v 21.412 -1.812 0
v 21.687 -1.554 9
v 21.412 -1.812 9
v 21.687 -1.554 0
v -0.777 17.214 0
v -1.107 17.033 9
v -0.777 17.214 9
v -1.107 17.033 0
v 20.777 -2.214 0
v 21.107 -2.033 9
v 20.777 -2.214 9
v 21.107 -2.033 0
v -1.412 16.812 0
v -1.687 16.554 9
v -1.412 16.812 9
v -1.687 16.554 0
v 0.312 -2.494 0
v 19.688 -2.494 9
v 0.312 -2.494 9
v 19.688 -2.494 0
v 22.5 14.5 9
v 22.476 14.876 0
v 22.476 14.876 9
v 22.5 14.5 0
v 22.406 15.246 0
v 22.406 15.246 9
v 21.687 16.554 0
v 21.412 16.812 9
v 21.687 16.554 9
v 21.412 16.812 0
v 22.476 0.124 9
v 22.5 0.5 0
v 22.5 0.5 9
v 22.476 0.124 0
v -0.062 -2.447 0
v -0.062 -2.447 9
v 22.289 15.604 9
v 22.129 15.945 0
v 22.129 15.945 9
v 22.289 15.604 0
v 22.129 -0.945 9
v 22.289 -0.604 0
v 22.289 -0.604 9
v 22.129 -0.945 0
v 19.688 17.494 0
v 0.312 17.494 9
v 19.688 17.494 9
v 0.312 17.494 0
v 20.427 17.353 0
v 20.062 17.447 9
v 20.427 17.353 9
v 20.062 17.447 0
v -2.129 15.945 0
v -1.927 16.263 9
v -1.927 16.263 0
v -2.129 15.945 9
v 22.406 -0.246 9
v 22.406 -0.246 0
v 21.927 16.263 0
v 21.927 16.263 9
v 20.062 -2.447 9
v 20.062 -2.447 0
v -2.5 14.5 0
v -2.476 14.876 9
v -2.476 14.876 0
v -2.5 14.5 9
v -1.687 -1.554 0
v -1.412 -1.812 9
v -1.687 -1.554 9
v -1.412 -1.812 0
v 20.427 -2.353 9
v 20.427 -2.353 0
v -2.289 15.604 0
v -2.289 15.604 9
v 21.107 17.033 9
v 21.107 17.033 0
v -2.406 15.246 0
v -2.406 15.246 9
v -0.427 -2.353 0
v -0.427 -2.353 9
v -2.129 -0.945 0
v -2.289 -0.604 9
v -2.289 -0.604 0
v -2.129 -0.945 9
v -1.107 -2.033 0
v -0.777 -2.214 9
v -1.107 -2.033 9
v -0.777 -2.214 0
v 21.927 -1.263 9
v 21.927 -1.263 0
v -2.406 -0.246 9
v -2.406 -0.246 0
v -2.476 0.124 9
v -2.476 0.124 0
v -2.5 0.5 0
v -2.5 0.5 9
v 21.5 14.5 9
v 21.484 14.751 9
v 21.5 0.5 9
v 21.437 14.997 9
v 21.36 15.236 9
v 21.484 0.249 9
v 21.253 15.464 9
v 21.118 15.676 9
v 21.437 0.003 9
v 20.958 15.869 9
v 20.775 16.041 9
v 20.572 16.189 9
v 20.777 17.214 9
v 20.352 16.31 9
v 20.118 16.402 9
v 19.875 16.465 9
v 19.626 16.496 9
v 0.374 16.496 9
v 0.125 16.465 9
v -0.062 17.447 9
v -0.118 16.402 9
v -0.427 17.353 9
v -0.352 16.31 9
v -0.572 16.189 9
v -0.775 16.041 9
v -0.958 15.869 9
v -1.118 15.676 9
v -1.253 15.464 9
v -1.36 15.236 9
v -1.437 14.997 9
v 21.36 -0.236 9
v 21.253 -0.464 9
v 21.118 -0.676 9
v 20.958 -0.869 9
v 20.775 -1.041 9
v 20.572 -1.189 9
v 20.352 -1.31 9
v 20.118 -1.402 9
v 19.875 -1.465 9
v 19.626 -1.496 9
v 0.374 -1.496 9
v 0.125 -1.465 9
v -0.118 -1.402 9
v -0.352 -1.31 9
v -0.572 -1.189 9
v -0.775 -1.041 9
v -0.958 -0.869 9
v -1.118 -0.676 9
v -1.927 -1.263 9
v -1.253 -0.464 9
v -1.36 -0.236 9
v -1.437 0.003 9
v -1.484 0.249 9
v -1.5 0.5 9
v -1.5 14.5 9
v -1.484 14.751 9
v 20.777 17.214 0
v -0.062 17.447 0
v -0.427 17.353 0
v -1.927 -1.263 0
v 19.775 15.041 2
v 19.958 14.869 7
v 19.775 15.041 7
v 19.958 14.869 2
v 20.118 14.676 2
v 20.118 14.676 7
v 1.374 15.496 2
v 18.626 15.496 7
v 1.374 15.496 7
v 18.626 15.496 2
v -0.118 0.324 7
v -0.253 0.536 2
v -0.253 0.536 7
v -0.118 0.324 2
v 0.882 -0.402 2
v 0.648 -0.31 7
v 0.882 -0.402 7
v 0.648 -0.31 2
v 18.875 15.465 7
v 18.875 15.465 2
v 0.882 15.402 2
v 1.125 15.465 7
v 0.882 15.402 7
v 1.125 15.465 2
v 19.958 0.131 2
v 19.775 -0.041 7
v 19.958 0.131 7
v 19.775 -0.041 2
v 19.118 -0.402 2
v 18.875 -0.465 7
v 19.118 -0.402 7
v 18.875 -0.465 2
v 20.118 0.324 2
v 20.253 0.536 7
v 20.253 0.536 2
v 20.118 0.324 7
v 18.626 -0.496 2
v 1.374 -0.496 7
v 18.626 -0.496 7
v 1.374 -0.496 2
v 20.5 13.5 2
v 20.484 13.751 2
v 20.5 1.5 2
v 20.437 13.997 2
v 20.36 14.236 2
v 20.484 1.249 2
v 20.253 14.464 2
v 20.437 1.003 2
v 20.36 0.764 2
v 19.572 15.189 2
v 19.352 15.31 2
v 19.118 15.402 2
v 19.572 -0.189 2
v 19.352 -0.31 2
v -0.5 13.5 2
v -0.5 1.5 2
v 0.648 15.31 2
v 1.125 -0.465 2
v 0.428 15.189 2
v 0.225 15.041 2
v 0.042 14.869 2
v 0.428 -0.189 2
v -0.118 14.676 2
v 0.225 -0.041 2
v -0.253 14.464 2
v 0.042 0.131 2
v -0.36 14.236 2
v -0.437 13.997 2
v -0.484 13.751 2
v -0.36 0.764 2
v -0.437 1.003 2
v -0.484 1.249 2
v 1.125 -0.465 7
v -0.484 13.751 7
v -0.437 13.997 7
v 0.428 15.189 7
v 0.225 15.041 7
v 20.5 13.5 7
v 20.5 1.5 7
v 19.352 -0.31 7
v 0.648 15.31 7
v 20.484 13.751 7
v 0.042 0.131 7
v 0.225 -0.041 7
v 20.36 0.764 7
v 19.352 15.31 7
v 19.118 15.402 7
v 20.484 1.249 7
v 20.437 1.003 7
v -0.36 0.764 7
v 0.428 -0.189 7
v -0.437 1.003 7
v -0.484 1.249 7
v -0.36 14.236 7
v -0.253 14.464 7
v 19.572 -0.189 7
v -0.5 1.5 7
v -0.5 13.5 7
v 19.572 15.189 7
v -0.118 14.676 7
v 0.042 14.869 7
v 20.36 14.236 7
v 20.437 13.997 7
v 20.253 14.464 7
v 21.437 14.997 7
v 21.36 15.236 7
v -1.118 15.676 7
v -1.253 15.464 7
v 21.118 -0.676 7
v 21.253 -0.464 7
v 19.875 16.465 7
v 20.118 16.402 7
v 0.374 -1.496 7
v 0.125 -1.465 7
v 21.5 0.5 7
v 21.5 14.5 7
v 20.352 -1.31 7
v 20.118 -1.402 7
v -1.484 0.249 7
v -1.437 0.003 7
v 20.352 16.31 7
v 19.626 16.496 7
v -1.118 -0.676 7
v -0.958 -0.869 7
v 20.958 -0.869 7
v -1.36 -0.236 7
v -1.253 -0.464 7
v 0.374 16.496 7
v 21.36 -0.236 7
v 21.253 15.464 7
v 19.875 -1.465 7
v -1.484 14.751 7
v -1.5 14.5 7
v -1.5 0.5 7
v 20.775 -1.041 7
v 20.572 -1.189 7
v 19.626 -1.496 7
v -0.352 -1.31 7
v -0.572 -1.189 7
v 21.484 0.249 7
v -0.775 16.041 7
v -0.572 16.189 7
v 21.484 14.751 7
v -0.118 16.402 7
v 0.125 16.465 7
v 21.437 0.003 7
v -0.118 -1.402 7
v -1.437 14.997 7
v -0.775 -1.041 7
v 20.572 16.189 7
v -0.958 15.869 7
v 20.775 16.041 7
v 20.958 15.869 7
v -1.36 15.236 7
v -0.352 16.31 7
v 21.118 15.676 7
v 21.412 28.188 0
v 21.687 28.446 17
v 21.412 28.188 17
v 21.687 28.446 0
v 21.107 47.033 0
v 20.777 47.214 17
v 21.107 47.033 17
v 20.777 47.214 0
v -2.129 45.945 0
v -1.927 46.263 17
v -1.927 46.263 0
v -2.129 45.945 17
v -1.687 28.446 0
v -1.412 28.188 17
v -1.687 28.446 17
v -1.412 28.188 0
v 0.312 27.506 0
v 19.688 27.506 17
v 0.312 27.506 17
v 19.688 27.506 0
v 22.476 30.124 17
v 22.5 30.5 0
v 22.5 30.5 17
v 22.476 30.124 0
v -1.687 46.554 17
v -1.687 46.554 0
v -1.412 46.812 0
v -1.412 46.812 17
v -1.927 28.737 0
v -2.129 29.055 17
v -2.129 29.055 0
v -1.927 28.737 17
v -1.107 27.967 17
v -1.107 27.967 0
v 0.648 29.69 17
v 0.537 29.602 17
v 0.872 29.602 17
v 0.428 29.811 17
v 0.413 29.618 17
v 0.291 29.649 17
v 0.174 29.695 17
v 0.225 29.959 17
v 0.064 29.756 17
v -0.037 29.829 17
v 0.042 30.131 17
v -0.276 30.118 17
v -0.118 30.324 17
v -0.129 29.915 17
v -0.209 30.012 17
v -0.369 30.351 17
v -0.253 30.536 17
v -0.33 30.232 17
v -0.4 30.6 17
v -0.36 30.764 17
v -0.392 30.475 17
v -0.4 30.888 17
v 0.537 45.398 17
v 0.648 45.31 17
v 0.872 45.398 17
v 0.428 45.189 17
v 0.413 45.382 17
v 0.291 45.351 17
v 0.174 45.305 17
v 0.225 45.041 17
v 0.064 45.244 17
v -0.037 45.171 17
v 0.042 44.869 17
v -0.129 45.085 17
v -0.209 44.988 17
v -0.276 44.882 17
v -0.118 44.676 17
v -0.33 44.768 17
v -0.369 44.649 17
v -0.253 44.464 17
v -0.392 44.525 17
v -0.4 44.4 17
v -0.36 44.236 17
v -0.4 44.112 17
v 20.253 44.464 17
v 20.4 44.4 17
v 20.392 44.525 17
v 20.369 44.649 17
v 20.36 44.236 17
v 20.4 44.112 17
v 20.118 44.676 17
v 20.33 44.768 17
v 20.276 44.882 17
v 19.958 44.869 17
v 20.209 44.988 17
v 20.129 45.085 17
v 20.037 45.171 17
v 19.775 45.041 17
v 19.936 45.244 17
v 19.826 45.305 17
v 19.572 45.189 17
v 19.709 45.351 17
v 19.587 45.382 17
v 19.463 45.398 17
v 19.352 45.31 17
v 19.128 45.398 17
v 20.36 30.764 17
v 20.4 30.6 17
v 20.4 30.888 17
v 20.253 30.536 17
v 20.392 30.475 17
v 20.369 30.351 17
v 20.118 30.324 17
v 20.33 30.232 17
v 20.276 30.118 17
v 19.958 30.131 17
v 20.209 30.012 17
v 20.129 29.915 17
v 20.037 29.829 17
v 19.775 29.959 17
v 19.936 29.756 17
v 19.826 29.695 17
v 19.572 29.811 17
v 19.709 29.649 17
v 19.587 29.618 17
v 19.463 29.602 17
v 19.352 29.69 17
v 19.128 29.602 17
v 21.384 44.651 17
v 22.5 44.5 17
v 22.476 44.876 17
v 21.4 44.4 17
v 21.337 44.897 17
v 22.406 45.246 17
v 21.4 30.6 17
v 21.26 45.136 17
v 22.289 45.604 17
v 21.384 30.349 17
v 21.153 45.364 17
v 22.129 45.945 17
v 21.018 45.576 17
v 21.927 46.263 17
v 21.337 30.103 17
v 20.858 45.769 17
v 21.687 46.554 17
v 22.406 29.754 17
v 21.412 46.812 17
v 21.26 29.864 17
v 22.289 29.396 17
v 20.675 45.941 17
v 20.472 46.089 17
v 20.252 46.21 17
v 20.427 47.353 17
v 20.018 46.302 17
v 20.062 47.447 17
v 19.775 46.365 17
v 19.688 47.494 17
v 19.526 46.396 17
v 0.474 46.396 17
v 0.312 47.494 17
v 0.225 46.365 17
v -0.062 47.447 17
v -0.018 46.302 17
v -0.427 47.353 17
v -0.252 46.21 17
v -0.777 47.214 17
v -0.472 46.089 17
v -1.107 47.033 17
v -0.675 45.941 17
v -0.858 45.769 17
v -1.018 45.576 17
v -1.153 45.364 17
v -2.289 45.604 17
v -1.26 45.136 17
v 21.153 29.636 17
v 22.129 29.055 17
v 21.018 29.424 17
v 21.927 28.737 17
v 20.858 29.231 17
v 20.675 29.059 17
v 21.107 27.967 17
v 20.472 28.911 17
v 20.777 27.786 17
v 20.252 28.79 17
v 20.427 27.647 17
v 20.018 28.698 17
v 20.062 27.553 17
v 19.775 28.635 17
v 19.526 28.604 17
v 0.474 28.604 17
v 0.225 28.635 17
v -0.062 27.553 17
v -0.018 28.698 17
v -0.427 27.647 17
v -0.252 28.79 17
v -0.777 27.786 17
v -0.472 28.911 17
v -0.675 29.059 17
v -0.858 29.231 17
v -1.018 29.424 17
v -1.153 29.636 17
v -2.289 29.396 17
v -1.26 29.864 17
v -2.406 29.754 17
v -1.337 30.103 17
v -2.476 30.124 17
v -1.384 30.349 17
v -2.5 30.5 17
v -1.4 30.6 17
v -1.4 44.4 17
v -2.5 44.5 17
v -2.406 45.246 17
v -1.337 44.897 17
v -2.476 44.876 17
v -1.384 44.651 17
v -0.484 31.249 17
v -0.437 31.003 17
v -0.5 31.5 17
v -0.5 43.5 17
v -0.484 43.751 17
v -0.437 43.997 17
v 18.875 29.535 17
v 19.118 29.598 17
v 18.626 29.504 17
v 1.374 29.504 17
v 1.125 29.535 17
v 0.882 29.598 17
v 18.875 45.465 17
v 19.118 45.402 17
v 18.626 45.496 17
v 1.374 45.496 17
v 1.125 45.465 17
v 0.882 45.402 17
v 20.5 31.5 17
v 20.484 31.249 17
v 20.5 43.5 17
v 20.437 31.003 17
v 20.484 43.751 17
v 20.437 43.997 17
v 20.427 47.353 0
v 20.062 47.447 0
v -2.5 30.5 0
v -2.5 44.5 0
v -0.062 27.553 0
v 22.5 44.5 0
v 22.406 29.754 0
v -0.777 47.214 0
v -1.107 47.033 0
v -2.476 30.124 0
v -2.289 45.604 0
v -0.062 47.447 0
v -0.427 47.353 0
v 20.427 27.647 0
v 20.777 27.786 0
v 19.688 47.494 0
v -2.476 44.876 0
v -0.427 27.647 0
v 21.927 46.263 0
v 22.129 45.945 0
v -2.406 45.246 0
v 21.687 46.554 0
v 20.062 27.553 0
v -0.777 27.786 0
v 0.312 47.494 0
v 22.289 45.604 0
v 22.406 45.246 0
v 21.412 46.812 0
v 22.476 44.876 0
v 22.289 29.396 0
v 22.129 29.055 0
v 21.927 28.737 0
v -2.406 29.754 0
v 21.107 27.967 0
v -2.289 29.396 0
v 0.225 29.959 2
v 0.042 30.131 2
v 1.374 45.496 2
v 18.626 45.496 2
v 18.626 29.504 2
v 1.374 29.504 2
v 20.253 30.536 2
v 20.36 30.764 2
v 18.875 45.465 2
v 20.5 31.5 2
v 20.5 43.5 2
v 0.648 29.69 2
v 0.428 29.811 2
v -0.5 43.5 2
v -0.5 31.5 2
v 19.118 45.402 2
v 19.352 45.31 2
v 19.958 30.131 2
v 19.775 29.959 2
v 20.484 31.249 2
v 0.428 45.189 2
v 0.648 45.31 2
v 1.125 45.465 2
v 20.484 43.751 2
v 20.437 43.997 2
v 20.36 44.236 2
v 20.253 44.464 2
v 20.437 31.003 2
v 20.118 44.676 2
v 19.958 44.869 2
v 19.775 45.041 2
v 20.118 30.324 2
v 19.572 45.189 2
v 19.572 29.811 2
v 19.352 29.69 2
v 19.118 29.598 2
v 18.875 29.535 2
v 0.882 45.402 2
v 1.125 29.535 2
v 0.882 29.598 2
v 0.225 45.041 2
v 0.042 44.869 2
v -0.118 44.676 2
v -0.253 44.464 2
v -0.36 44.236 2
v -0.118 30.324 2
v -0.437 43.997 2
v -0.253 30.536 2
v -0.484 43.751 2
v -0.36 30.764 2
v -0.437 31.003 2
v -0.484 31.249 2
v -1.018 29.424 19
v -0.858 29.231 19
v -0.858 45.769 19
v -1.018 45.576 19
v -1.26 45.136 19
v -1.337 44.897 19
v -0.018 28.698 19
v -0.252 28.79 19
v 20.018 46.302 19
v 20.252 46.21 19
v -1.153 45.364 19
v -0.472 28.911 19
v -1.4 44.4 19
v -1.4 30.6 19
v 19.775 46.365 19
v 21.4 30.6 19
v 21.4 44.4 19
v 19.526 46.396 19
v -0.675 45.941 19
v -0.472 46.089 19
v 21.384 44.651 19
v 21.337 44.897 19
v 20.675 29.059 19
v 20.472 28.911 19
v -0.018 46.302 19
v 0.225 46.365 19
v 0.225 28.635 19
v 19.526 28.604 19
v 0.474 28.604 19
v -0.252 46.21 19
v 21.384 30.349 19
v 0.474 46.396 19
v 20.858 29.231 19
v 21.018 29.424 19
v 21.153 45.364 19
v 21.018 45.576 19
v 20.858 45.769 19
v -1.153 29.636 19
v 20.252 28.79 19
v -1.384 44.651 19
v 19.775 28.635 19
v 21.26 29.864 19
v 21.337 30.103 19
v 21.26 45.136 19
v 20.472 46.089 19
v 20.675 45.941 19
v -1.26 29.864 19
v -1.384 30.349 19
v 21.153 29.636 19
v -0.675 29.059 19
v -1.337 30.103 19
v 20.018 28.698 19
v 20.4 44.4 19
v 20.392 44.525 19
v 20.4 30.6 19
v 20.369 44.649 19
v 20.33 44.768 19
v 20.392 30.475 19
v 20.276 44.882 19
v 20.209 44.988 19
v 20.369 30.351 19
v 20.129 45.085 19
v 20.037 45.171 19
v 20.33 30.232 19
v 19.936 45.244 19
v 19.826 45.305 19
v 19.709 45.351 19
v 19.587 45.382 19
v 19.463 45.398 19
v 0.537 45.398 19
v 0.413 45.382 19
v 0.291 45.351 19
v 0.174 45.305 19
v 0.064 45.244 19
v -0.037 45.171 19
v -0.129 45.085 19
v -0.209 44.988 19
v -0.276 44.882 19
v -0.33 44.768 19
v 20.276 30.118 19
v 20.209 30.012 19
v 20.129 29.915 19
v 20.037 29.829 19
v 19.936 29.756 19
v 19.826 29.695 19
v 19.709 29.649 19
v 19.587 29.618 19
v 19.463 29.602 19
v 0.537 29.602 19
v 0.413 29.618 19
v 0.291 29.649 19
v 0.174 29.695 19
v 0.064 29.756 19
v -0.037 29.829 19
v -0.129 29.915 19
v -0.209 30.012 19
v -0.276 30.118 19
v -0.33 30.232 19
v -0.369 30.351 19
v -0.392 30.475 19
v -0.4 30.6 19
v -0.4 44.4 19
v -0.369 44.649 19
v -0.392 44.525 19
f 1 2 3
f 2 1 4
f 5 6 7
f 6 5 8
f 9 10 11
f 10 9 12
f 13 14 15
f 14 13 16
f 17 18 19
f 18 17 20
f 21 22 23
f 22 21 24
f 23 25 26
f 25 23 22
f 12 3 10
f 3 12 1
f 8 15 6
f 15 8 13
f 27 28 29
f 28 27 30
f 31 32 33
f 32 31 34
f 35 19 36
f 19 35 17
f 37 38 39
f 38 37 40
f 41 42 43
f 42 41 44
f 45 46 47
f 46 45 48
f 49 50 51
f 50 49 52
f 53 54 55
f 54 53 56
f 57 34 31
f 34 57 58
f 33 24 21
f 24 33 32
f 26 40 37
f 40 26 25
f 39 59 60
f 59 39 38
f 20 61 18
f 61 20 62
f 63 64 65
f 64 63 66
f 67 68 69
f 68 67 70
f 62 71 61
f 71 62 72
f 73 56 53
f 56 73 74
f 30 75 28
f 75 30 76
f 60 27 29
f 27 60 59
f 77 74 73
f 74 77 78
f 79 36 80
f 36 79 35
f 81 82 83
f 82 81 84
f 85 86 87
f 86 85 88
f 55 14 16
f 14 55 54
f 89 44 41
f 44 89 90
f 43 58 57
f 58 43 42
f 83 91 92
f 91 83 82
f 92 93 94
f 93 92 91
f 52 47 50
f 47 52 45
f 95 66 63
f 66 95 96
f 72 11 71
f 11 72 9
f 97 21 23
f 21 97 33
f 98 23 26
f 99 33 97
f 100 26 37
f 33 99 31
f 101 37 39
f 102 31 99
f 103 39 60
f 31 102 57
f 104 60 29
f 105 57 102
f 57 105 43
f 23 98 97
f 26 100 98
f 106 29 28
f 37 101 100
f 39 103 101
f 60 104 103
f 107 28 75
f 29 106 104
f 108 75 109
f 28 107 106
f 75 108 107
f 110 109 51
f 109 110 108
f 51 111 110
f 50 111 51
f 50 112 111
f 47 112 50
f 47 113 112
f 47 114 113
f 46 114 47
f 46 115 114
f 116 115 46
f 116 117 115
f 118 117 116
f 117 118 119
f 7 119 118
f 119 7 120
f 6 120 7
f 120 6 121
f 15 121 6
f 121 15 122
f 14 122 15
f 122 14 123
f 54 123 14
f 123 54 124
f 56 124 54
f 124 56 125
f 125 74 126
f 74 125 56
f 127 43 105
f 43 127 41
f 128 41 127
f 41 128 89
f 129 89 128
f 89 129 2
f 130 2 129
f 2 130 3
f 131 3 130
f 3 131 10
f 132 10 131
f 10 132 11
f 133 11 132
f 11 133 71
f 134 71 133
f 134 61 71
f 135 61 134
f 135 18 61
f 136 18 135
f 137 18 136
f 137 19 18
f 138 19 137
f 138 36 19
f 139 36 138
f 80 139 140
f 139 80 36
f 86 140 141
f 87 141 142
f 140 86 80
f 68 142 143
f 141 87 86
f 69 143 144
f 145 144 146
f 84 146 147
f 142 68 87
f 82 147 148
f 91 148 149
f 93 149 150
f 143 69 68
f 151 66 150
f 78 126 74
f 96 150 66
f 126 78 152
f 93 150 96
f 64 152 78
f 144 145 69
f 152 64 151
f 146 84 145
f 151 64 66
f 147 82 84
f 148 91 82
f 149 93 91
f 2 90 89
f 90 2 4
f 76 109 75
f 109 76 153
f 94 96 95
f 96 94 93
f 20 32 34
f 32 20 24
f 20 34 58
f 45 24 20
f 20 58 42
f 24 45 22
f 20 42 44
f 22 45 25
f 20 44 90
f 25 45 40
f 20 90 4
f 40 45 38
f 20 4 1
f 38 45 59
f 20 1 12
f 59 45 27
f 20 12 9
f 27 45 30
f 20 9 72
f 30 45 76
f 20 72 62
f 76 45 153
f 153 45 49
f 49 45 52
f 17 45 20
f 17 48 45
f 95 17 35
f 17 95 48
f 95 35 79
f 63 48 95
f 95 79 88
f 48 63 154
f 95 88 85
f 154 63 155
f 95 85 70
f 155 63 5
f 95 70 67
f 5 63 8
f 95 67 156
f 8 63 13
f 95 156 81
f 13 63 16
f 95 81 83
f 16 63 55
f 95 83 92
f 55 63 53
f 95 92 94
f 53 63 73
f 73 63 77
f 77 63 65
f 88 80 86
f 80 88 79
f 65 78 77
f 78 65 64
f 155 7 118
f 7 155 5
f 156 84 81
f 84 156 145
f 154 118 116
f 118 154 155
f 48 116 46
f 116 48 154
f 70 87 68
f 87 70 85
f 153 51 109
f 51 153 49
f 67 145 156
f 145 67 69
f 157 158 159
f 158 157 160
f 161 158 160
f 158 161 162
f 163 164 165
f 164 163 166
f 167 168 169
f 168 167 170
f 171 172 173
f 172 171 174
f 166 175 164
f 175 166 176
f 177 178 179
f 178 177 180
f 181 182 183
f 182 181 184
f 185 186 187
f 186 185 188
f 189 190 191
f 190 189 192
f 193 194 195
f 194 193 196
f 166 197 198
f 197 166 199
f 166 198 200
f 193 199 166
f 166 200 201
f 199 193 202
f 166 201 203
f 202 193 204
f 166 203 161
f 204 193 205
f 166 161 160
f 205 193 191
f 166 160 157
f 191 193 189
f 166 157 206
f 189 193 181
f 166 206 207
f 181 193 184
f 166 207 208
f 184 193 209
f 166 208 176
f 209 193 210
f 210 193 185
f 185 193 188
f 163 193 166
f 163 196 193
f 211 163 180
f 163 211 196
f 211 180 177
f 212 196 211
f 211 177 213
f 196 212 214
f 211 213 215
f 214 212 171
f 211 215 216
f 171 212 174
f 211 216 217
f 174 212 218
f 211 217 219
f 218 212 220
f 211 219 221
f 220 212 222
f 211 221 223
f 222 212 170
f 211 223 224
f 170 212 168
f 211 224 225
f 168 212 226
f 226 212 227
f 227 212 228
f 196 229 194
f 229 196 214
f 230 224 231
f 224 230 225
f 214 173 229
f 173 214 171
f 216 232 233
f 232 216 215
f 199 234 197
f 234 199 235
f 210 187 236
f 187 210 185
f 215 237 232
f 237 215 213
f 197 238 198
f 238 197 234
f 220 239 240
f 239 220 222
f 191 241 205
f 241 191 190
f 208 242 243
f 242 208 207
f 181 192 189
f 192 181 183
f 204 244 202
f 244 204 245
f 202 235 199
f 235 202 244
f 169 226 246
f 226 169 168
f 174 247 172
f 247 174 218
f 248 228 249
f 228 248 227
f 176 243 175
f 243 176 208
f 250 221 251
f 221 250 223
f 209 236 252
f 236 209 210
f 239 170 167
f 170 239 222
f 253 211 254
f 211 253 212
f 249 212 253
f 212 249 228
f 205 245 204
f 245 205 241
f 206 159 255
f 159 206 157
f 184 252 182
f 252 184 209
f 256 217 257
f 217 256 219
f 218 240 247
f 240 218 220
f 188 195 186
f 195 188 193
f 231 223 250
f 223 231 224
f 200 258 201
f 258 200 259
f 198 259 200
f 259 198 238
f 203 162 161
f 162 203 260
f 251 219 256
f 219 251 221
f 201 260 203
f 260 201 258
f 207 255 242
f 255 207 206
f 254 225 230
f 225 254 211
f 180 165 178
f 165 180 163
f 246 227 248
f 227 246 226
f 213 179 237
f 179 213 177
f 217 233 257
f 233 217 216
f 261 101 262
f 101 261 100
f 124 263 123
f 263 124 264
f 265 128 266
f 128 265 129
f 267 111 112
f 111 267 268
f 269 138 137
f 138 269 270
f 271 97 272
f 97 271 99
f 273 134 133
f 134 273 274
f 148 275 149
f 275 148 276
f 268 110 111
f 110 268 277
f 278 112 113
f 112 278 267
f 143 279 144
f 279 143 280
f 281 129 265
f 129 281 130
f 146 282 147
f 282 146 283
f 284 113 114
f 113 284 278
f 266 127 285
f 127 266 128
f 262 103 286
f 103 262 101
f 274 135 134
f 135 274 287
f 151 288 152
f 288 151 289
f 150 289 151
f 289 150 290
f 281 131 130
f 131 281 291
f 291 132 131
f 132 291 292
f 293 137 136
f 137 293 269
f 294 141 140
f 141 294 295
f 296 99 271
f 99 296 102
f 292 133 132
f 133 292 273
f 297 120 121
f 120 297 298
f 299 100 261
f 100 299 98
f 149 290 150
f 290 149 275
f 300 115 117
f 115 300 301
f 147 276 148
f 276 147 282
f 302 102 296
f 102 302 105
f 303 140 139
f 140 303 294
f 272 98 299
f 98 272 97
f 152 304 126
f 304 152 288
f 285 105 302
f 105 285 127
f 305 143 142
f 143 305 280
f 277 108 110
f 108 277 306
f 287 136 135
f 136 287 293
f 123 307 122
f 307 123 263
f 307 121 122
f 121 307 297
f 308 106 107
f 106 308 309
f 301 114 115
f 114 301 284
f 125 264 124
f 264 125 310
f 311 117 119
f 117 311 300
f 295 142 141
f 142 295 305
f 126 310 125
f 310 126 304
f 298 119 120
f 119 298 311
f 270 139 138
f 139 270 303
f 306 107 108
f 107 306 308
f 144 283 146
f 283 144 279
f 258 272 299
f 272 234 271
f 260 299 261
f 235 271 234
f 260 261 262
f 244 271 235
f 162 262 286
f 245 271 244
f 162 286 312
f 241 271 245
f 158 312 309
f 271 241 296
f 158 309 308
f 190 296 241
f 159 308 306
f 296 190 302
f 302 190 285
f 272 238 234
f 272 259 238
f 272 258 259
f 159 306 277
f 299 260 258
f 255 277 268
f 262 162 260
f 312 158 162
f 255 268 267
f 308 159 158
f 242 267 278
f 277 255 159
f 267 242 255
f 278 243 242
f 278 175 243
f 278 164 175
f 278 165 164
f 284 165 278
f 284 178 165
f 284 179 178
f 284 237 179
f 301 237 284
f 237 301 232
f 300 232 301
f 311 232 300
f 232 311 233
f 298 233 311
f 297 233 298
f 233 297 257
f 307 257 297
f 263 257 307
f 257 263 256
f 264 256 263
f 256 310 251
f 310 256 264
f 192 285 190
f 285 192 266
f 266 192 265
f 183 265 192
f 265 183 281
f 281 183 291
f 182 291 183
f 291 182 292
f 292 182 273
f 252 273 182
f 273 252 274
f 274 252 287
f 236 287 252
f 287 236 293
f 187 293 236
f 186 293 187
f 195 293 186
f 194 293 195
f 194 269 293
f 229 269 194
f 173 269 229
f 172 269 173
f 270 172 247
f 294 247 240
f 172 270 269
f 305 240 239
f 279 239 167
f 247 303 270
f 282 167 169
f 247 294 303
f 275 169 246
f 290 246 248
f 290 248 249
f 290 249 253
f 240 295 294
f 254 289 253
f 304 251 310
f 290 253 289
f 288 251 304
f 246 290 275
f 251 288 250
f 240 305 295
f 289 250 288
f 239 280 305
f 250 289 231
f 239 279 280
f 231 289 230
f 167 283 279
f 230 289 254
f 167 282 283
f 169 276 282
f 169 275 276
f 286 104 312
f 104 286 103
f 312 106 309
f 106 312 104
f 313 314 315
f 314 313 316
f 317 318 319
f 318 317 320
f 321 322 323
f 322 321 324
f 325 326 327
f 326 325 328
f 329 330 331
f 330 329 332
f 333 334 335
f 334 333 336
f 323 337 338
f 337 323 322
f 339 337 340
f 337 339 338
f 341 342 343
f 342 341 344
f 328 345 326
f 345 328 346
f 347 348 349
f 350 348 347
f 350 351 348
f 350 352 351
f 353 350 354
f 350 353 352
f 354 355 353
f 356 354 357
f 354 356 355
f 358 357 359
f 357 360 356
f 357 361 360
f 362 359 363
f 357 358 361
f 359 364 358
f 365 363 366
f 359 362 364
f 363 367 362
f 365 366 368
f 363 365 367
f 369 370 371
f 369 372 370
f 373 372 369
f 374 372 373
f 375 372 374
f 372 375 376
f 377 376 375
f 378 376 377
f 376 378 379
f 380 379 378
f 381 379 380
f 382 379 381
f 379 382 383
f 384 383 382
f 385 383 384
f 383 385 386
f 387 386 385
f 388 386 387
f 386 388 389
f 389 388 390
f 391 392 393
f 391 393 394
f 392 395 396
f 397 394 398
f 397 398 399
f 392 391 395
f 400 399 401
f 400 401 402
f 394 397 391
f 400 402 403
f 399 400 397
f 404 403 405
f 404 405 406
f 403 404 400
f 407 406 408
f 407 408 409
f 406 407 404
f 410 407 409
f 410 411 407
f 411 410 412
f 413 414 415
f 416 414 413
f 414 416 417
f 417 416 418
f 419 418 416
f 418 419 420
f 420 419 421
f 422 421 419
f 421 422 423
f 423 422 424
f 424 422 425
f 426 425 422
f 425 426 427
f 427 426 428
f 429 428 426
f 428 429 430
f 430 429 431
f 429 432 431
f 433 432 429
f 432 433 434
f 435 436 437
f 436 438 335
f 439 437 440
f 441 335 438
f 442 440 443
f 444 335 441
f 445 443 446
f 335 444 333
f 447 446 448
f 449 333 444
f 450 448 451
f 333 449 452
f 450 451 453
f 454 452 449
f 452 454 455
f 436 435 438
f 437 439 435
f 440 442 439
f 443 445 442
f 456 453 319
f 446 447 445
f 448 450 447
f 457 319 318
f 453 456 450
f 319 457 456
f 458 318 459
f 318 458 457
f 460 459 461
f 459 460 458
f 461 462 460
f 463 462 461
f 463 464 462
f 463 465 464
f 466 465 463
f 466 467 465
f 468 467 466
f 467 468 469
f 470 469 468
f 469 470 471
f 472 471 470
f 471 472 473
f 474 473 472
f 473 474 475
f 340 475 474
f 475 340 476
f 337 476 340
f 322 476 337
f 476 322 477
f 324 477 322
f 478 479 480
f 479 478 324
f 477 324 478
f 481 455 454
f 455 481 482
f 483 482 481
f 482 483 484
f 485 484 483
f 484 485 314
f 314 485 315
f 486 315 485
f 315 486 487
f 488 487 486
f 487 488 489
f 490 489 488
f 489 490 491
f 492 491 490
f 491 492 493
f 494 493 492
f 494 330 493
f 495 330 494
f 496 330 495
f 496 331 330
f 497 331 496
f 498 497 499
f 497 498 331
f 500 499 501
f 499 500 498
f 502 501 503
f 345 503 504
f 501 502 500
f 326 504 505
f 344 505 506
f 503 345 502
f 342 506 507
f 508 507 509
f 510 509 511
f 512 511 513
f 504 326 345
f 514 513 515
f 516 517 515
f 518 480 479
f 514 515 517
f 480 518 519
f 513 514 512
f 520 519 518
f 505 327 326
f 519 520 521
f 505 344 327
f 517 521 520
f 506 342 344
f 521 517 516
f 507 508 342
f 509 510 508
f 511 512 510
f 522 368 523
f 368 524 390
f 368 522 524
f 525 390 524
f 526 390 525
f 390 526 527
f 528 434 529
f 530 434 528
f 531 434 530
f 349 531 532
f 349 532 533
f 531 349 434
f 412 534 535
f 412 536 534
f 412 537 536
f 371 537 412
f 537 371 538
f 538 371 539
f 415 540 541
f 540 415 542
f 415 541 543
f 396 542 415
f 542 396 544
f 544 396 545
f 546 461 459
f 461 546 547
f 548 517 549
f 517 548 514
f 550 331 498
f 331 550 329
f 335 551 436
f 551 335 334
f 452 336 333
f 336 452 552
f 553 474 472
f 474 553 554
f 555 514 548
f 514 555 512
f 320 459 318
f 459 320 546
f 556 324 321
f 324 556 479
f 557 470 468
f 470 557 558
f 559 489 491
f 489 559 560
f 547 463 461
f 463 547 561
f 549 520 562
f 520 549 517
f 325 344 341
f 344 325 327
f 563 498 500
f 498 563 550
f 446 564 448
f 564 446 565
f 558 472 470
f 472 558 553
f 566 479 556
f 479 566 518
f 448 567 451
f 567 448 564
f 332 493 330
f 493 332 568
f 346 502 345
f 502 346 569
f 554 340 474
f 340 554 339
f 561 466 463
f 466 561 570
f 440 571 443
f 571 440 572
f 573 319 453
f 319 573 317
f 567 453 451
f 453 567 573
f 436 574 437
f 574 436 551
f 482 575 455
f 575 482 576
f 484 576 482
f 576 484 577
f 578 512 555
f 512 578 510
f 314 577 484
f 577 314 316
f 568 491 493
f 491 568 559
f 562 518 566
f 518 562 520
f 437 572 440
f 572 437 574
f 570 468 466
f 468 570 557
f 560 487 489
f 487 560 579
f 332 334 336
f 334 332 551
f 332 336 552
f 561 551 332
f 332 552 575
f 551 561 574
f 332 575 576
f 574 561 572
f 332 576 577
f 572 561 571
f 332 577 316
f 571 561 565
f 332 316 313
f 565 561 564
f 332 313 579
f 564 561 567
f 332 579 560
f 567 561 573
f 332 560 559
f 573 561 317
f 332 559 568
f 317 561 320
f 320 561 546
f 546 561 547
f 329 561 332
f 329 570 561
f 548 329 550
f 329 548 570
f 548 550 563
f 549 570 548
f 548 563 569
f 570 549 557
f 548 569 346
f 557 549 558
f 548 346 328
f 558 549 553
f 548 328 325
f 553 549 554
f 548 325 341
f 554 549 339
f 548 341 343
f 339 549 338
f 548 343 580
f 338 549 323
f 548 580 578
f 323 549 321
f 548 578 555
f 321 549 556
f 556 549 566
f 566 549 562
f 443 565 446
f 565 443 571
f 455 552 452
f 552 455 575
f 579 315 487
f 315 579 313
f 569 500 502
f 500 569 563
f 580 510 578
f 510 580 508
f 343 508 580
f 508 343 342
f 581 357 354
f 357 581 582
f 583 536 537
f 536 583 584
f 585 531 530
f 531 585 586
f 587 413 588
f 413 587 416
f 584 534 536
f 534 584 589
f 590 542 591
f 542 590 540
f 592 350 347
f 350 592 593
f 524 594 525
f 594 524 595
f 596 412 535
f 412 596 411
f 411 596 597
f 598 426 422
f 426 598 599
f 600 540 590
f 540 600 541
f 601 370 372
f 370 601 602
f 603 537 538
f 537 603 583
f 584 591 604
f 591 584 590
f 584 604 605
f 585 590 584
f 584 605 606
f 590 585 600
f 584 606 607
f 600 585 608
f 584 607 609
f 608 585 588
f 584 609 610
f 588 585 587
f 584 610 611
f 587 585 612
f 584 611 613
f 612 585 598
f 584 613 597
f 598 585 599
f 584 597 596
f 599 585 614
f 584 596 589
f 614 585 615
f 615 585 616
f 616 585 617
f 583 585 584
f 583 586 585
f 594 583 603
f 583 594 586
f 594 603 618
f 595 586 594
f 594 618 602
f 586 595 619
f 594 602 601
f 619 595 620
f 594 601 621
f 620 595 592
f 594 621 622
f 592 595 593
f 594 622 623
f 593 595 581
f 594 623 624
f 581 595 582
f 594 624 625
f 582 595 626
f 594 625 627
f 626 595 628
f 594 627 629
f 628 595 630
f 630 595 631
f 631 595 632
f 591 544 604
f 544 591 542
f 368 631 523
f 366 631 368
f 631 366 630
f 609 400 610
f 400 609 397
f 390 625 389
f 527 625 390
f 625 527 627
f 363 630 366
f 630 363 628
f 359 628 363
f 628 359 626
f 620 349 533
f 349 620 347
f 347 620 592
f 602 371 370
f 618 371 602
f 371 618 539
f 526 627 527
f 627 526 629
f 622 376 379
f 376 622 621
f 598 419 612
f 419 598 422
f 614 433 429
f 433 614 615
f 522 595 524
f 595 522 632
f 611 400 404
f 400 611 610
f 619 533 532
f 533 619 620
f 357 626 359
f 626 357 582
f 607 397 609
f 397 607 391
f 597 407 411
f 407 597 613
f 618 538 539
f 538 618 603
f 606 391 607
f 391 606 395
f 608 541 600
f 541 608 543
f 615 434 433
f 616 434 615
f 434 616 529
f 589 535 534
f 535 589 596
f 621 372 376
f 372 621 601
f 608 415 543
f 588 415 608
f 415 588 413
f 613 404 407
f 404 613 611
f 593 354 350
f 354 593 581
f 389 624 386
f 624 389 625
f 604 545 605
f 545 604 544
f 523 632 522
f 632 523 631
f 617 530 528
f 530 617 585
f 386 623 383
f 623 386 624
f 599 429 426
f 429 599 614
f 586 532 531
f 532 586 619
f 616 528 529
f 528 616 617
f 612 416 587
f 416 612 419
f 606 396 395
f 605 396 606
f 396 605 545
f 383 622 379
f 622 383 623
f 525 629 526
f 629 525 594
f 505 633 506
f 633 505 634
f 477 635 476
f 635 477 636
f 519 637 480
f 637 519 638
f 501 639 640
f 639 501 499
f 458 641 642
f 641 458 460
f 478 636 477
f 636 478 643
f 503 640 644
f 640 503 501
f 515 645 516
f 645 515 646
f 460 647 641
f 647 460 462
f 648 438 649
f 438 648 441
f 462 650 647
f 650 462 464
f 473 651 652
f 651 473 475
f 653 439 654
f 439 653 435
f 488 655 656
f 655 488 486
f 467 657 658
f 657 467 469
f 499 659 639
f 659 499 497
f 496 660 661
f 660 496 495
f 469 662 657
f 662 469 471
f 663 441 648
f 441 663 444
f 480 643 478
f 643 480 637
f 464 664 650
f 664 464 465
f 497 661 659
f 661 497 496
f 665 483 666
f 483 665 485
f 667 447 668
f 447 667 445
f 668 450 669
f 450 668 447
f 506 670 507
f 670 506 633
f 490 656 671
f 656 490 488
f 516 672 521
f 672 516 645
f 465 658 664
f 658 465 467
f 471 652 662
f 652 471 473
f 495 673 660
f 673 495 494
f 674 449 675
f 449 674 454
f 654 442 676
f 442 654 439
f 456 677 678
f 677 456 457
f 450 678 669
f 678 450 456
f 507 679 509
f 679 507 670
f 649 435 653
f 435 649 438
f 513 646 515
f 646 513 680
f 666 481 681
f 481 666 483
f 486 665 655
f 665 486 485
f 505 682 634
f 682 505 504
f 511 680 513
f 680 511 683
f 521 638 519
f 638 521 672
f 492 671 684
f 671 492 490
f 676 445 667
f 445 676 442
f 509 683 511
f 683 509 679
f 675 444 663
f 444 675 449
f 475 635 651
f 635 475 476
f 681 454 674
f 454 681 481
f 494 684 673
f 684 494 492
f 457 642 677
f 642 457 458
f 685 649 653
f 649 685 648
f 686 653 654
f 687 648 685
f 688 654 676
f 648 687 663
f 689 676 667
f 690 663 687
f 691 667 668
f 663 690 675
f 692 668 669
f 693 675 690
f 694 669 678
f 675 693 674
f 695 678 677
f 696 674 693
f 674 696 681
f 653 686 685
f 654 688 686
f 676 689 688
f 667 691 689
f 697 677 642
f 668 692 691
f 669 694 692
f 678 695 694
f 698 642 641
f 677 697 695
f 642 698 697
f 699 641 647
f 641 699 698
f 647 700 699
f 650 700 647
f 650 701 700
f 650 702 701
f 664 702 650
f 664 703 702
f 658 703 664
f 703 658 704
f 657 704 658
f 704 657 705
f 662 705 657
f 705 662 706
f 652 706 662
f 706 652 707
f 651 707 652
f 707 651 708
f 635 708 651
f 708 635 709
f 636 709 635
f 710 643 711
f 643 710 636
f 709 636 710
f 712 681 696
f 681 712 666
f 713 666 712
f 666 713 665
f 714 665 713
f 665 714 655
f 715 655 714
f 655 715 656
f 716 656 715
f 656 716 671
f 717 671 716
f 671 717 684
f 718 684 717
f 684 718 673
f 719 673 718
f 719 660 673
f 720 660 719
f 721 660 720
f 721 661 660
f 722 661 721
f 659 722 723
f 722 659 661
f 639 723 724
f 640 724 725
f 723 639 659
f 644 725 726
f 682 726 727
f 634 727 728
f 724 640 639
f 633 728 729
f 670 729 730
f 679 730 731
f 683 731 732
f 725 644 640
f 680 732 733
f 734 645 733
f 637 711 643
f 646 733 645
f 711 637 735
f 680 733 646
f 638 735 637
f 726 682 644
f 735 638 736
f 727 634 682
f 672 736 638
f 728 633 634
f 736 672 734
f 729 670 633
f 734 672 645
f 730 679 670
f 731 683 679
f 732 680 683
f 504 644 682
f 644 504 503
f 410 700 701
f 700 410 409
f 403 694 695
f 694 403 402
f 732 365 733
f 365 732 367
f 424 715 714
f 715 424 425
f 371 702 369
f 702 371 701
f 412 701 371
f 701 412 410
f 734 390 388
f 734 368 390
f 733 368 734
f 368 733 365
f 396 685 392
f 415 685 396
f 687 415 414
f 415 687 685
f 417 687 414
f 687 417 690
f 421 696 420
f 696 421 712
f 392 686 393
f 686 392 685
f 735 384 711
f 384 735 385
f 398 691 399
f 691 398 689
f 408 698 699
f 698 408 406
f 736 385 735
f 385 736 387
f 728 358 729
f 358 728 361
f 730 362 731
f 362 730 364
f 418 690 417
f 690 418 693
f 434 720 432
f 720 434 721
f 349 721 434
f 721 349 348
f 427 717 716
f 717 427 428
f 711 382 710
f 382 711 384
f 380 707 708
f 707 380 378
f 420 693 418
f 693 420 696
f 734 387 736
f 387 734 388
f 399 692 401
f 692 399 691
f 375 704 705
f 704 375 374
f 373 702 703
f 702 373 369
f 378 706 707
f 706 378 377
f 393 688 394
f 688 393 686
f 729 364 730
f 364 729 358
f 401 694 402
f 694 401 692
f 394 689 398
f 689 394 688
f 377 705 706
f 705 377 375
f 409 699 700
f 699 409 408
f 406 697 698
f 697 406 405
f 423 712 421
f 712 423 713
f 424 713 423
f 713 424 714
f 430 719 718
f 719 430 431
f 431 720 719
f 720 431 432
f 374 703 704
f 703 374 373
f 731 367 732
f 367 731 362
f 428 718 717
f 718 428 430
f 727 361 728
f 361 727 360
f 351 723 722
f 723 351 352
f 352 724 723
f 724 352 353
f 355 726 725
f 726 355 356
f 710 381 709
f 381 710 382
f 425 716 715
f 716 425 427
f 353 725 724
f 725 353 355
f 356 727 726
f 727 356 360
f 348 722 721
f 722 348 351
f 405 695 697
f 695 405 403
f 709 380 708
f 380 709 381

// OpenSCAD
// PulseLab Forge Enclosure for: Voltage Divider
// Auto-generated parametric model

/* [Parámetros Generales] */
board_w = 20.0;
board_h = 15.0;
wall = 2.0;
clearance = 0.5;
standoff_h = 5.0;
base_z = 2.0;
lip_h = 2.0;
total_inner_h = standoff_h + 15; // Altura interior total aproximada

$fn = 50;

// Cálculos derivados
inner_w = board_w + clearance * 2;
inner_h = board_h + clearance * 2;
outer_w = inner_w + wall * 2;
outer_h = inner_h + wall * 2;

module rounded_rect(w, h, r, height) {
    hull() {
        translate([r, r, 0]) cylinder(r=r, h=height);
        translate([w-r, r, 0]) cylinder(r=r, h=height);
        translate([w-r, h-r, 0]) cylinder(r=r, h=height);
        translate([r, h-r, 0]) cylinder(r=r, h=height);
    }
}

module boss() {
    difference() {
        cylinder(h=standoff_h, d=6); // Pilar externo
        translate([0,0,-1]) cylinder(h=standoff_h+2, d=2.8); // Agujero para tornillo autorroscante M3
    }
}

module bottom_shell() {
    difference() {
        // Base exterior sólida
        translate([-wall - clearance, -wall - clearance, 0])
            rounded_rect(outer_w, outer_h, 3, base_z + standoff_h + lip_h);
        
        // Vaciado interior principal
        translate([-clearance, -clearance, base_z])
            rounded_rect(inner_w, inner_h, 2, standoff_h + lip_h + 1);
            
        // Vaciado para escalón de encaje (Lip)
        translate([-clearance - wall/2, -clearance - wall/2, base_z + standoff_h])
            rounded_rect(inner_w + wall, inner_h + wall, 2, lip_h + 1);
    }
    
    // Añadir Pilares de montaje
}

module top_shell() {
    // Parte superior de la caja (tapa)
    top_h = total_inner_h - standoff_h;
    translate([0, outer_h + 10, 0]) { // Mover a un lado
        difference() {
            // Techo exterior
            translate([-wall - clearance, -wall - clearance, 0])
                rounded_rect(outer_w, outer_h, 3, base_z + top_h);
            
            // Vaciado interior
            translate([-clearance, -clearance, base_z])
                rounded_rect(inner_w, inner_h, 2, top_h + 1);
        }
        // Borde de encaje (Rim)
        translate([-clearance - wall/2 + 0.1, -clearance - wall/2 + 0.1, base_z + top_h])
            difference() {
                rounded_rect(inner_w + wall - 0.2, inner_h + wall - 0.2, 2, lip_h);
                translate([wall/2, wall/2, -1])
                    rounded_rect(inner_w - 0.2, inner_h - 0.2, 1, lip_h + 2);
            }
    }
}

// Representación unificada
bottom_shell();
top_shell();
